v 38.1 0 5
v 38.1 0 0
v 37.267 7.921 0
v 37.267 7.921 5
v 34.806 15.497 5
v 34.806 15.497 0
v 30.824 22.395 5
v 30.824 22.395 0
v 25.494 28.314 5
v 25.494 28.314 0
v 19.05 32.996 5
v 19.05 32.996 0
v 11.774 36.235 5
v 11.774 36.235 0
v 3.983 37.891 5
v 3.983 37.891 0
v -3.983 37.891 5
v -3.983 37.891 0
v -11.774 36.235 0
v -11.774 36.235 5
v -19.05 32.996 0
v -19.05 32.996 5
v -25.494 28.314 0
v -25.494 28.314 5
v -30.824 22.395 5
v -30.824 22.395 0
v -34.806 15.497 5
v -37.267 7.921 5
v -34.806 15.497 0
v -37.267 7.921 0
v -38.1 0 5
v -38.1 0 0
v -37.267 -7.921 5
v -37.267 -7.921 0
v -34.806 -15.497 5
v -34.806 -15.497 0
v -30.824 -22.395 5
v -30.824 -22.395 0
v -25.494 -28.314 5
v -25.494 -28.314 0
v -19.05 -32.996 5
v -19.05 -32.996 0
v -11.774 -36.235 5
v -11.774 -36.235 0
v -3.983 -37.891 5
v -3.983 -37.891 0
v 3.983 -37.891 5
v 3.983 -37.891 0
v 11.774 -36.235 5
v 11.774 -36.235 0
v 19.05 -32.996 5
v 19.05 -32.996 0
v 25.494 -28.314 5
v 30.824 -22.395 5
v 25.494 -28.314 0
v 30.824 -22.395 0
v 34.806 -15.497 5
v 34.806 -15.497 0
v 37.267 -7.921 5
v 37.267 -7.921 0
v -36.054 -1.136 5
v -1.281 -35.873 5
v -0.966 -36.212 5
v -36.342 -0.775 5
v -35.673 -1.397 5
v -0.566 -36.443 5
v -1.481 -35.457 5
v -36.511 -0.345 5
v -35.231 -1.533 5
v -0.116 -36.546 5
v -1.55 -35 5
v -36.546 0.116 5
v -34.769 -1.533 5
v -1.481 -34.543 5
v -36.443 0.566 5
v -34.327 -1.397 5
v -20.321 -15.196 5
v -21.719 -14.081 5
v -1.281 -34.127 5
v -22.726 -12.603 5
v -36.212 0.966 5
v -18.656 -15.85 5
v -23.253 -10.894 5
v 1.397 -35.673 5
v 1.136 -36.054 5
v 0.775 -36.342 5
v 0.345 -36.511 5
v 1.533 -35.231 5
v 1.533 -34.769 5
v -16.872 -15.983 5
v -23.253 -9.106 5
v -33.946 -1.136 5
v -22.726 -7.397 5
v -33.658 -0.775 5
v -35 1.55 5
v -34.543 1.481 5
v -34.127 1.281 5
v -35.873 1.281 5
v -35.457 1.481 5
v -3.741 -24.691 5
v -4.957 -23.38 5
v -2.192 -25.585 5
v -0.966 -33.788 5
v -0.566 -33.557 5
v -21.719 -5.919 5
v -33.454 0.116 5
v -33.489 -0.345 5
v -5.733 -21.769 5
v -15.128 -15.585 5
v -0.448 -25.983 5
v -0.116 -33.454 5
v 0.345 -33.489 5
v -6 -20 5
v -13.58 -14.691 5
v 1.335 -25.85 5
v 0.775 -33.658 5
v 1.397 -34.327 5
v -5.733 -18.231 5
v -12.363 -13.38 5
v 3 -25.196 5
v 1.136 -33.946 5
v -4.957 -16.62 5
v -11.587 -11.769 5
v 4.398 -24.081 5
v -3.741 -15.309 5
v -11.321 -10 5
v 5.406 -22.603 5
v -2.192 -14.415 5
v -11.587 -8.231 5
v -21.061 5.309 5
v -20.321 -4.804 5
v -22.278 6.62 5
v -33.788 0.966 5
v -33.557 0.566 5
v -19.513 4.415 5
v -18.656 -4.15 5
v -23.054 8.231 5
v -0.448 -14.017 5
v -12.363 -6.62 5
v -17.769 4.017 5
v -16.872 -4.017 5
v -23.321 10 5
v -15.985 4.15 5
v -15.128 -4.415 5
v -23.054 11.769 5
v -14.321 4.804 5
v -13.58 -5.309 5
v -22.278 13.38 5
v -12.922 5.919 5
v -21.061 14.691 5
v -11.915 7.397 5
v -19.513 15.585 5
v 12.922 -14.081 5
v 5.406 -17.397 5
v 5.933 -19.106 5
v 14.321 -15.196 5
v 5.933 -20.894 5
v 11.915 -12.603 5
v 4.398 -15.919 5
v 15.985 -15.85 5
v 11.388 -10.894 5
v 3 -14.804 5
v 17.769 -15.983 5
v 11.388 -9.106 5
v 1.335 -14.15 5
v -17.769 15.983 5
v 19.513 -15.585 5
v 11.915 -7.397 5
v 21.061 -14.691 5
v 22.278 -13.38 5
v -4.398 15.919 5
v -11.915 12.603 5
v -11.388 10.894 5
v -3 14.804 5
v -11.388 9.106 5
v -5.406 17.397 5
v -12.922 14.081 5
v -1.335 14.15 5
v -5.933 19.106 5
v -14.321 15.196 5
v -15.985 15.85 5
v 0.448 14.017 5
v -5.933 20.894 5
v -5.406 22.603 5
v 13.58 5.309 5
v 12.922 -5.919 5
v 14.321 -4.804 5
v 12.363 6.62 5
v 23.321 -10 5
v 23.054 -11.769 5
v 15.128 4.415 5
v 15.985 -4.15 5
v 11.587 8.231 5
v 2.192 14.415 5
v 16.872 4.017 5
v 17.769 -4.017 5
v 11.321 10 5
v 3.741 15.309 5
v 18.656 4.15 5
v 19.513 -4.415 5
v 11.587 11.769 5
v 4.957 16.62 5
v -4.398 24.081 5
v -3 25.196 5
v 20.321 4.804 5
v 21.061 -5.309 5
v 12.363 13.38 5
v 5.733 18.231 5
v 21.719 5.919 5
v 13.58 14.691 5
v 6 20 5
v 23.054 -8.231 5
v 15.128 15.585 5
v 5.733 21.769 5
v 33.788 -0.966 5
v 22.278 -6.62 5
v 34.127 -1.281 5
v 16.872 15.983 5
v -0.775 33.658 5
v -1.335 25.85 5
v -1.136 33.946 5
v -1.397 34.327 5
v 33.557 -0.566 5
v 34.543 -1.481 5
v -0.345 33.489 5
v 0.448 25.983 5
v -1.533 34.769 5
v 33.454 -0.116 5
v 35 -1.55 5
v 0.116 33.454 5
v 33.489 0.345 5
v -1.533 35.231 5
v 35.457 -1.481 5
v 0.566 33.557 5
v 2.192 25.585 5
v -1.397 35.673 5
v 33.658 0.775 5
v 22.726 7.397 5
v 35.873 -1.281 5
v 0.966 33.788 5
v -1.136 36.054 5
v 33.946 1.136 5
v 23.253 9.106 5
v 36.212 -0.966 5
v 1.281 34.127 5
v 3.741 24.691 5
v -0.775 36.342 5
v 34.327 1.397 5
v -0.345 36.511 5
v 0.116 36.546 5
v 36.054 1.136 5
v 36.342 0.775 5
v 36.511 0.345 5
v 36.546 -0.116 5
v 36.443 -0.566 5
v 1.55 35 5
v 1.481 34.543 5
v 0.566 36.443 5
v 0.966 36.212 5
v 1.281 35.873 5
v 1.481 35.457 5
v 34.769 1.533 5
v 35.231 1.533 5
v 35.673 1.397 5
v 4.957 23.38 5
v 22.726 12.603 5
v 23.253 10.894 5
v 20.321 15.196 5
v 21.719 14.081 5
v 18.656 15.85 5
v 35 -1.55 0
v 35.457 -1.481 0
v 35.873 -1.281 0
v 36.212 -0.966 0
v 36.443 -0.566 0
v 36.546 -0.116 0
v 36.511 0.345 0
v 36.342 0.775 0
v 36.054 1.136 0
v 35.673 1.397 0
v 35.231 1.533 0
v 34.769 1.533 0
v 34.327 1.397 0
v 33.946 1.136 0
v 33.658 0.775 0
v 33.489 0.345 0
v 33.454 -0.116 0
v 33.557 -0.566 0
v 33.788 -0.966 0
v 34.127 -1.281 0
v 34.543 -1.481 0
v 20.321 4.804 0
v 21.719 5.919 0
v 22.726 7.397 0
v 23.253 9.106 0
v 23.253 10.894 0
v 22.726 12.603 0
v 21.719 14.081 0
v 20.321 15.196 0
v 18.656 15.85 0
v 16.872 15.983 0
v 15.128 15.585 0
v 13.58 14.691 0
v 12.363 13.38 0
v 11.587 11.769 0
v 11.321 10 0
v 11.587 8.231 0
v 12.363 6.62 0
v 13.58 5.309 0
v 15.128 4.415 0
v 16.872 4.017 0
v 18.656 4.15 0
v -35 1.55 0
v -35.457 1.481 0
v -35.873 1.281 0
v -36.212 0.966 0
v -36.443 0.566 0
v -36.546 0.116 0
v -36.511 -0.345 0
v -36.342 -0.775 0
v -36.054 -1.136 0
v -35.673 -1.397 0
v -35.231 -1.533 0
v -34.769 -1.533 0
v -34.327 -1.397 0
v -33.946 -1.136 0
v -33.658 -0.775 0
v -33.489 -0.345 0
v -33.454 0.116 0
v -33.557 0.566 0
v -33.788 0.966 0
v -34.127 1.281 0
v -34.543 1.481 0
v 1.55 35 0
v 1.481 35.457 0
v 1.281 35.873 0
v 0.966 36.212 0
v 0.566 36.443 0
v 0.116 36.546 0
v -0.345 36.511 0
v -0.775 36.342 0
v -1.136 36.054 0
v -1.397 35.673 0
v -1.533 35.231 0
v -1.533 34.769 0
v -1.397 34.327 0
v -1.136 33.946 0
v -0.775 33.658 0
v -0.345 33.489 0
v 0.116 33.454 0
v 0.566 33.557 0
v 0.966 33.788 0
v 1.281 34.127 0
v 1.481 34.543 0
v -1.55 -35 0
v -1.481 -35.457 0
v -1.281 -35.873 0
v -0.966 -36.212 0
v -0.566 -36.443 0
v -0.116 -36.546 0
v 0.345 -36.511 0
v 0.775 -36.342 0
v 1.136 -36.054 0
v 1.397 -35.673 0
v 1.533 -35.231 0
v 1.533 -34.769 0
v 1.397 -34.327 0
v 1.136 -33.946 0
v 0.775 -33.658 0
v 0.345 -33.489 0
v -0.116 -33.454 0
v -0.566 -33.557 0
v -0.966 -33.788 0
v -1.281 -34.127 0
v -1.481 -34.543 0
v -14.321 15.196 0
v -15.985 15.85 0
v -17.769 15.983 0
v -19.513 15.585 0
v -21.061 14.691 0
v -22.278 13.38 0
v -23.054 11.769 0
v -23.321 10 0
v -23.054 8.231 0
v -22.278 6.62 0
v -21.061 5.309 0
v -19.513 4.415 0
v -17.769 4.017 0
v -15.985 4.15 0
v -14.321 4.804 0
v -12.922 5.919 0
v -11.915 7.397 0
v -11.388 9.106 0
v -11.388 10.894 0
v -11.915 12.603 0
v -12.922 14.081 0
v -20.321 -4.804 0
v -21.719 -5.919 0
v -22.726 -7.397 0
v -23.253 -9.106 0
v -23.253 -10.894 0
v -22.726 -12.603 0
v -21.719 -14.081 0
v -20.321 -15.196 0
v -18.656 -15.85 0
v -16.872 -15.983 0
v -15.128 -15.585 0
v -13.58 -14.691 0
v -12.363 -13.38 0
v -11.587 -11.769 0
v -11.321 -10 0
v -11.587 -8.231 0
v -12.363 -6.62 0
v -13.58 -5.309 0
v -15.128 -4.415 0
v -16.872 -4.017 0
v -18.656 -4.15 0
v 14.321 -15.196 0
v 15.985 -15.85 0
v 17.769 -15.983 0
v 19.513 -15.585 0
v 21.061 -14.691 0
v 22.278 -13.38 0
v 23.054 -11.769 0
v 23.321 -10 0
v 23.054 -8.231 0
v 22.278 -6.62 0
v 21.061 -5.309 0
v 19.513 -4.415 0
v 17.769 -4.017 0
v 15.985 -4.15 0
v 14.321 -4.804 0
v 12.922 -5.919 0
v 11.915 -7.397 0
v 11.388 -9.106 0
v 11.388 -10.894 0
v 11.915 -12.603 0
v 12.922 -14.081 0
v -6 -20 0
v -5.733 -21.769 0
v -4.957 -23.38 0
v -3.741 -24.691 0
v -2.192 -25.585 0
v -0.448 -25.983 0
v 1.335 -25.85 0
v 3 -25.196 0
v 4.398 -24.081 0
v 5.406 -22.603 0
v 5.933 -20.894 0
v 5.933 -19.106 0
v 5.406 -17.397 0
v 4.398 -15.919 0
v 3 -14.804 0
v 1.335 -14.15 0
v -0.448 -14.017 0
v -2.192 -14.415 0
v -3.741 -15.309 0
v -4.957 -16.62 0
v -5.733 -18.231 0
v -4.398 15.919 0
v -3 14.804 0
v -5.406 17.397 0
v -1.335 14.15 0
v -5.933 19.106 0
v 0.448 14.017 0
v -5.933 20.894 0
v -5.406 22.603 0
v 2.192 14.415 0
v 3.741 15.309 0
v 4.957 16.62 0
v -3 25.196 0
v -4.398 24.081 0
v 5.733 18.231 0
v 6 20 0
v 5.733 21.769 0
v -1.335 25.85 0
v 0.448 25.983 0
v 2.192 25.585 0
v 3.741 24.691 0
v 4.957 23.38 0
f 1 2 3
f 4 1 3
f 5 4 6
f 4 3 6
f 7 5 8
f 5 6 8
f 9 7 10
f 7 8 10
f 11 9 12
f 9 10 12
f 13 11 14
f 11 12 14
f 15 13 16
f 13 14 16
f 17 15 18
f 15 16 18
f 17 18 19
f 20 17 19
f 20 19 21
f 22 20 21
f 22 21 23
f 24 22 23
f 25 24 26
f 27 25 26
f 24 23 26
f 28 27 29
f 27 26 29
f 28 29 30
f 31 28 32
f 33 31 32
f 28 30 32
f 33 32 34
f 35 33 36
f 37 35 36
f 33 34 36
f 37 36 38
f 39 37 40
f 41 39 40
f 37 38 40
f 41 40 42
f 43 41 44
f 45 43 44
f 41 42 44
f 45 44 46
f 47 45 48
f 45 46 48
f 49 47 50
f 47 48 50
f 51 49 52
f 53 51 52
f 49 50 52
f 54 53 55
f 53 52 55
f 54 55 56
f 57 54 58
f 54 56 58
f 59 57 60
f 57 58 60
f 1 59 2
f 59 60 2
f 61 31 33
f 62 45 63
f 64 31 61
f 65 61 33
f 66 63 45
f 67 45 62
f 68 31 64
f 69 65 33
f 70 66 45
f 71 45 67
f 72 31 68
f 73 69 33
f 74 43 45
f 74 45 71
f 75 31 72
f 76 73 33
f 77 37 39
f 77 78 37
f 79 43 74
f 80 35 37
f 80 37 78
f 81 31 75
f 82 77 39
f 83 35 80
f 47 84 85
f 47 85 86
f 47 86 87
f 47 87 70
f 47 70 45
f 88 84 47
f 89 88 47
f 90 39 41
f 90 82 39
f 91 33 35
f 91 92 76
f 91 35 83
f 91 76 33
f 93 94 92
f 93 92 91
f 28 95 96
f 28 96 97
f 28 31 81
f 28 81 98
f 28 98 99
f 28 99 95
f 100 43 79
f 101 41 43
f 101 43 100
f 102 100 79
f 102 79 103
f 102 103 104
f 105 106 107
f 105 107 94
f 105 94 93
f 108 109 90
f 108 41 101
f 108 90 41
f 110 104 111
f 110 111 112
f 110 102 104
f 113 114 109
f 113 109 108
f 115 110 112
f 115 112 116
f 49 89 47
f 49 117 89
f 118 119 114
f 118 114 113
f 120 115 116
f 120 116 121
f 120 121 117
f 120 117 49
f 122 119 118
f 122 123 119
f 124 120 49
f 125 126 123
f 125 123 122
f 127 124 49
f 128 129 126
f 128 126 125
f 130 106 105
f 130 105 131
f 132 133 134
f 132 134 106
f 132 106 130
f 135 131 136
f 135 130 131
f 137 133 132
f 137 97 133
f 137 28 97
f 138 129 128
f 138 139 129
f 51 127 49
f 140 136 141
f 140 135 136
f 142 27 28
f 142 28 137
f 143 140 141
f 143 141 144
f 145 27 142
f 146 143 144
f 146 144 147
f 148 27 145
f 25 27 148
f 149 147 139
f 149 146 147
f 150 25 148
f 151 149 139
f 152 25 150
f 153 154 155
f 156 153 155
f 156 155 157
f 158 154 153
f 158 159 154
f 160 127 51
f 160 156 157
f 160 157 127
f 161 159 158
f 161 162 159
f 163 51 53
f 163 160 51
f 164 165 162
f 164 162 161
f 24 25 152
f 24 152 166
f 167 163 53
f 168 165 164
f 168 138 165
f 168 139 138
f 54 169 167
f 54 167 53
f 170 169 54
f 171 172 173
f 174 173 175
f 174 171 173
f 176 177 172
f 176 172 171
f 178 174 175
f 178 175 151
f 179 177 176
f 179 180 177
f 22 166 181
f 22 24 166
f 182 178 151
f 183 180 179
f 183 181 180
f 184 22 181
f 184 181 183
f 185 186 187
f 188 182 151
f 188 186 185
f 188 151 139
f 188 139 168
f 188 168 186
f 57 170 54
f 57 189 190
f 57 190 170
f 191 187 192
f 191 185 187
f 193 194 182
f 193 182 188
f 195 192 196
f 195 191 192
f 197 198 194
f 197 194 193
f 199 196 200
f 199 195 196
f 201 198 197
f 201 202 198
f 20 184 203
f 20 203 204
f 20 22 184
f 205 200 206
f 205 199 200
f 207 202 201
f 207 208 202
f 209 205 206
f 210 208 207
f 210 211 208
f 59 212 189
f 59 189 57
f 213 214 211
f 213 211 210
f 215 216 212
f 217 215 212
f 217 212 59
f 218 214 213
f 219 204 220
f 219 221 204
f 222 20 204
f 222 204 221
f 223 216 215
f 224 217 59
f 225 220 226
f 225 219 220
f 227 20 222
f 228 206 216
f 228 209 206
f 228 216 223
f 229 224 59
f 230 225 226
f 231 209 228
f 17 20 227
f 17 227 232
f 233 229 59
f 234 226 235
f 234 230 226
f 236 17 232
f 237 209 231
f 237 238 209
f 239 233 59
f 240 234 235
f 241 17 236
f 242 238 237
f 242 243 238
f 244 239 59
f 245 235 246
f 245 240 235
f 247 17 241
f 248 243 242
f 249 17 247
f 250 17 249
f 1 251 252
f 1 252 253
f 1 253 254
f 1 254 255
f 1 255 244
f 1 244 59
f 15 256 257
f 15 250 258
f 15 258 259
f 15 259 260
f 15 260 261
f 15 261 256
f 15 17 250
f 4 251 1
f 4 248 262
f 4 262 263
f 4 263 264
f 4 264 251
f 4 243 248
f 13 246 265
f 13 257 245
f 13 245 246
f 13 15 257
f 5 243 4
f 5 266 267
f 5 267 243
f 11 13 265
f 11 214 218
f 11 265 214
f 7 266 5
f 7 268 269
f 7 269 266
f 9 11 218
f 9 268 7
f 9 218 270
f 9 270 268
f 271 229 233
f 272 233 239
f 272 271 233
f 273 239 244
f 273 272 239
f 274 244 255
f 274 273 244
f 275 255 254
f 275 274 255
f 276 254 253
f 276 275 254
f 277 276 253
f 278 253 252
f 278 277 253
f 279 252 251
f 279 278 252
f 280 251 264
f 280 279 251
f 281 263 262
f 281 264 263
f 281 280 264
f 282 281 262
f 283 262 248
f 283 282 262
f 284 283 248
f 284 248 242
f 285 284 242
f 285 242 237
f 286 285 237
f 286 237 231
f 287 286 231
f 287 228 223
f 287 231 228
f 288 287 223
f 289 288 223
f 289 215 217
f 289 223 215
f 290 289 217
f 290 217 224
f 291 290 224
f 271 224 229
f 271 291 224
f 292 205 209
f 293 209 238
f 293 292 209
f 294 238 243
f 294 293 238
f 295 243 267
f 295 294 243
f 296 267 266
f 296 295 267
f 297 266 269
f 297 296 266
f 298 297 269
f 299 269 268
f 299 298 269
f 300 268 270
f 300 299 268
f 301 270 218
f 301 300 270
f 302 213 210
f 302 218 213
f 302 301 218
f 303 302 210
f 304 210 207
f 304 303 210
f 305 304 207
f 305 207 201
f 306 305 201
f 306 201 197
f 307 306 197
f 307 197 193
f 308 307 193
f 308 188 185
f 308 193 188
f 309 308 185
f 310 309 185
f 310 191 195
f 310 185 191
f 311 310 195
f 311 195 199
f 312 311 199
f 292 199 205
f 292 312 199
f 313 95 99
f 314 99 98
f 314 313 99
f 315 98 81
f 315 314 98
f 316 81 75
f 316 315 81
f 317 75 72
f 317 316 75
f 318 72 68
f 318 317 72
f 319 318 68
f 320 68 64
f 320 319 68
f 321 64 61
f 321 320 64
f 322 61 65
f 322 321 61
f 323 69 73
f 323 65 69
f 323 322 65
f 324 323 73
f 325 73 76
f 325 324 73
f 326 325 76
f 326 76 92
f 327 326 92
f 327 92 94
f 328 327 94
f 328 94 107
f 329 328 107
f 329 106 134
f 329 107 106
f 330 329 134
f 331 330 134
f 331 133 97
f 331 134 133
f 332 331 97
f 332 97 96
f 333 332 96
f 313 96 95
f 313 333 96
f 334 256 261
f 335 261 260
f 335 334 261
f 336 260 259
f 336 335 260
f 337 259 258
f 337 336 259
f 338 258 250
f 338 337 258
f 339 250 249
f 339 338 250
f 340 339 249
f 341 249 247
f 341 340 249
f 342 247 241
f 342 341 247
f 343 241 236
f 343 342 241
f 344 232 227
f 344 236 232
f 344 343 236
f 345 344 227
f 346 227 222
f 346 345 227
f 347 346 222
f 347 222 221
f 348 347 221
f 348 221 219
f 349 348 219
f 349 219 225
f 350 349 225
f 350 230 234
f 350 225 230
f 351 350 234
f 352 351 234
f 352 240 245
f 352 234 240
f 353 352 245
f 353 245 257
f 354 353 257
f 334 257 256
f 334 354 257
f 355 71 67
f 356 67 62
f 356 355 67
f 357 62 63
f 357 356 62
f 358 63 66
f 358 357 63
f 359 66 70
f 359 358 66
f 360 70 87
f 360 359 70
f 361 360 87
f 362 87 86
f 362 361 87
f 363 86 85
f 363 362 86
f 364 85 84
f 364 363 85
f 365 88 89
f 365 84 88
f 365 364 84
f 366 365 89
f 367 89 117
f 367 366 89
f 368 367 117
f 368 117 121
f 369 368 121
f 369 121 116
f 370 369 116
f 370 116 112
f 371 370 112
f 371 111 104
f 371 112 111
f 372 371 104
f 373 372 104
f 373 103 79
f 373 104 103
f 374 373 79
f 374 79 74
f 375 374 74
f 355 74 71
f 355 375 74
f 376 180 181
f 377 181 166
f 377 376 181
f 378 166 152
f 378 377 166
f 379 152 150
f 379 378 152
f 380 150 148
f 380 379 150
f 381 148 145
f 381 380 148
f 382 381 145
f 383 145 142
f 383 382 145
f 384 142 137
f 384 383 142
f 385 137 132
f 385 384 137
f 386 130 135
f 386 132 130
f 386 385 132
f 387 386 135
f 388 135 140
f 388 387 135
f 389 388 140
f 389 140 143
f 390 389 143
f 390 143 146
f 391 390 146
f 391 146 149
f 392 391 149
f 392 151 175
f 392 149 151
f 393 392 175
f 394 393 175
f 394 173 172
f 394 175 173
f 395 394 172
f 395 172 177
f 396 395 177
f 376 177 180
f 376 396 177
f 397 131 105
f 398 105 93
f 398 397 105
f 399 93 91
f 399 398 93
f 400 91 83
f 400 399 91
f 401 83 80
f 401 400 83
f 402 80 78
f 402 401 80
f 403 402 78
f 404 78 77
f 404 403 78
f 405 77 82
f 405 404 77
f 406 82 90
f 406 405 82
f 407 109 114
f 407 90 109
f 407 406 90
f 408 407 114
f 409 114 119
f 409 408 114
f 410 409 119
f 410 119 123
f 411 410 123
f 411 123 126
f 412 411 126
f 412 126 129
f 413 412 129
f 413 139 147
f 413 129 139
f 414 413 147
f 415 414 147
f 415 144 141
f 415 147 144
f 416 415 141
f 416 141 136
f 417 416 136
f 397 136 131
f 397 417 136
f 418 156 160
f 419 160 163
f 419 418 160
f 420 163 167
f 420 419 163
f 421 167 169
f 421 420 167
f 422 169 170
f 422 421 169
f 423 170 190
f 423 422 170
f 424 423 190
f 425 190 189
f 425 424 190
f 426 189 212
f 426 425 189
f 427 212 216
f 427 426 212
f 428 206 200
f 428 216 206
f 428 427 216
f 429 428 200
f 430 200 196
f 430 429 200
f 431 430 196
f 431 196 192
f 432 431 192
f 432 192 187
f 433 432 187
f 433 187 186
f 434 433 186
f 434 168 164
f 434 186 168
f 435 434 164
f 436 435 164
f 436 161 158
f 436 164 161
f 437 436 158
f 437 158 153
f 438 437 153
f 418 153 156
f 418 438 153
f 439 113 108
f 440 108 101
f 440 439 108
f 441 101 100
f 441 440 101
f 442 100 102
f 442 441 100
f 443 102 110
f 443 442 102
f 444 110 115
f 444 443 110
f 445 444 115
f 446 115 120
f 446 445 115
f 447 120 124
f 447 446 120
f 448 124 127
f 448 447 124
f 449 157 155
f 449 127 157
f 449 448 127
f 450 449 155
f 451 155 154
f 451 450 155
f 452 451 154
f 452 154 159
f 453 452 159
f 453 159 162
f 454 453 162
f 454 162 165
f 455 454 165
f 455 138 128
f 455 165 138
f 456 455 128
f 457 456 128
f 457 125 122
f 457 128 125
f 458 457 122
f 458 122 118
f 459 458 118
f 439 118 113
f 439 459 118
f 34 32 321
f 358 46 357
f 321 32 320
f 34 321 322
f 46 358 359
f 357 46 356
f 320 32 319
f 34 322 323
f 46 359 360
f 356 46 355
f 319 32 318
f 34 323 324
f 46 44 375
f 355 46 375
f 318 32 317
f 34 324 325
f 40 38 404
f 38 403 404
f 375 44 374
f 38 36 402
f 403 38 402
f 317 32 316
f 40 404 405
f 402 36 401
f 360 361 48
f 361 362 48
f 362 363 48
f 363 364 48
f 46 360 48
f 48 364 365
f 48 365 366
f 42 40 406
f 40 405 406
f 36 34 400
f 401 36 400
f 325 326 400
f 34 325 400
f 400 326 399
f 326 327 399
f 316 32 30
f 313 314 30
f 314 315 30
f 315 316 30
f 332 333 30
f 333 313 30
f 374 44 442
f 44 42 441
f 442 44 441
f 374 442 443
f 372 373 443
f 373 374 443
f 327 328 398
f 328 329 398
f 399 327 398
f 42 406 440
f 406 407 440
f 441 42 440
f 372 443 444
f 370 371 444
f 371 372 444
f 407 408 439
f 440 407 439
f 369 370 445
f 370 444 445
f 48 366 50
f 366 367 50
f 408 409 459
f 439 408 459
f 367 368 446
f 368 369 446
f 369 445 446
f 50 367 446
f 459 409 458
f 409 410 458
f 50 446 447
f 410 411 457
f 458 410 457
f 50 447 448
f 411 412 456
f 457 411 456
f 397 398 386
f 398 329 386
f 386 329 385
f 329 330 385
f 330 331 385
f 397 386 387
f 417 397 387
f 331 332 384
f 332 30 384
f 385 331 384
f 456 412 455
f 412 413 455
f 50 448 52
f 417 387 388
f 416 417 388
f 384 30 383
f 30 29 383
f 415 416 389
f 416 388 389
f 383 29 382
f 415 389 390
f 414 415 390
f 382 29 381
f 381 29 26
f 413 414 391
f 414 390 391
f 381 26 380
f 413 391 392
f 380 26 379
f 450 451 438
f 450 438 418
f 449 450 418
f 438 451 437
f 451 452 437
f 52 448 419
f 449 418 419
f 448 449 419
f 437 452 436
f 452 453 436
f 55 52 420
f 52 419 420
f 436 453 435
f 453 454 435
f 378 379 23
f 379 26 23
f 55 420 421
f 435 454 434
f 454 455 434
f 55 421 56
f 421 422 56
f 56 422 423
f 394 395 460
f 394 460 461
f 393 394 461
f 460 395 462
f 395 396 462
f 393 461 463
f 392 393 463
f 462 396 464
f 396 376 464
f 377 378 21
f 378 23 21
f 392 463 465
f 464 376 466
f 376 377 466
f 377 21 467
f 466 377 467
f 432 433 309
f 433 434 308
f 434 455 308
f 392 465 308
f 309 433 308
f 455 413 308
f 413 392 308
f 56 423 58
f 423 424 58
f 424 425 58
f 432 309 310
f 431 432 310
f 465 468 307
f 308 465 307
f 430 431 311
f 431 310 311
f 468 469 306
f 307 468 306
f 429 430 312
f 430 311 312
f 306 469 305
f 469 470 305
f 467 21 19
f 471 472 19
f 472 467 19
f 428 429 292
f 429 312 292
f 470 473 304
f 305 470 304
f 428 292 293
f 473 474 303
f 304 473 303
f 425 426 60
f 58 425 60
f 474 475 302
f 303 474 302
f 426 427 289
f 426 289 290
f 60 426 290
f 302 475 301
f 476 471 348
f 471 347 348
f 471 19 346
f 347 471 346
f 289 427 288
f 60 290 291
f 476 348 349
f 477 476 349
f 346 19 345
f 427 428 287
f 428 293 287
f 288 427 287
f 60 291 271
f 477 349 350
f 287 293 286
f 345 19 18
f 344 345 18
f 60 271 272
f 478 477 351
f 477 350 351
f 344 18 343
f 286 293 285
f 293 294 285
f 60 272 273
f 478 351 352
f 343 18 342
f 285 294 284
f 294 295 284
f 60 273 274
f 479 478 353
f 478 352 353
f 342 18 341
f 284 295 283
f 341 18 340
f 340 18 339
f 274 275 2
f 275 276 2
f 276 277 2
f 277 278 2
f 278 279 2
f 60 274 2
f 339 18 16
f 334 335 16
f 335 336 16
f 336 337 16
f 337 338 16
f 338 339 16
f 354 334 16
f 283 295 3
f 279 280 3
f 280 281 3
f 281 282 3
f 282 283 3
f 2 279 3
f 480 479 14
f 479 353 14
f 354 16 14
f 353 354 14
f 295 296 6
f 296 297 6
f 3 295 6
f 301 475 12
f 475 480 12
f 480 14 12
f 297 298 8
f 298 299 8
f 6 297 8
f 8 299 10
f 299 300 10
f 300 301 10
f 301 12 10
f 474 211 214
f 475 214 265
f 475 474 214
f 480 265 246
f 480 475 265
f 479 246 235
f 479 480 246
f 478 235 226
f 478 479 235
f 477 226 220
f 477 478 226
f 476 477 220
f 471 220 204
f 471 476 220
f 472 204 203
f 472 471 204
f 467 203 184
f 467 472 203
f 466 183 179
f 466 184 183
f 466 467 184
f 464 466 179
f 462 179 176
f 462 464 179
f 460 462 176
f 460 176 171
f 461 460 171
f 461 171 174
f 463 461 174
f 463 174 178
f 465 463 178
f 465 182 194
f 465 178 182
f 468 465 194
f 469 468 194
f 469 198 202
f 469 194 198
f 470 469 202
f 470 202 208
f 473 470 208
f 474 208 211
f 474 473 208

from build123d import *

# Parameters (mm, degrees)
F0_R     = 38.1
F0_R_2   = 7.5
F0_R_3   = 6
F0_R_4   = 1.55
F1_DEPTH = 5
F2_DEPTH = 25
F3_COUNT = 6
F4_DEPTH = 25
F5_COUNT = 4
F6_DEPTH = 5


with BuildPart() as f1:
    # F0 (on Top) → F1 (new body)
    with BuildSketch(Plane.XY):
        Circle(F0_R)
        Circle(F0_R_2, mode=Mode.SUBTRACT)
        with Locations((0, 20)):
            Circle(F0_R_3, mode=Mode.SUBTRACT)
        with Locations((0, 35)):
            Circle(F0_R_4, mode=Mode.SUBTRACT)
        with Locations((0, 20)):
            Circle(F0_R_3)
        with Locations((0, 35)):
            Circle(F0_R_4)
    extrude(amount=F1_DEPTH)

    # F3: F2 ×6 about axis
    f3_axis = Axis((0, 0, 5), (0, 0, 1))


with BuildPart() as f2:
    # F0 (on Top) → F2 (new body)
    with BuildSketch(Plane.XY):
        with Locations((0, 20)):
            Circle(F0_R_3)
    extrude(amount=F2_DEPTH)


with BuildPart() as f1_1:
    add(f1.part)
    for i in range(1, F3_COUNT):
        add(f2.part.rotate(f3_axis, i * 360 / F3_COUNT), mode=Mode.SUBTRACT)

    # F3#seed: cut F2
    add(f2.part, mode=Mode.SUBTRACT)

    # F5: F4 ×4 about axis
    f5_axis = Axis((0, 0, 5), (0, 0, 1))


with BuildPart() as f4:
    # F0 (on Top) → F4 (new body)
    with BuildSketch(Plane.XY):
        with Locations((0, 35)):
            Circle(F0_R_4)
    extrude(amount=F4_DEPTH)


with BuildPart() as f1_2:
    add(f1_1.part)
    for i in range(1, F5_COUNT):
        add(f4.part.rotate(f5_axis, i * 360 / F5_COUNT), mode=Mode.SUBTRACT)

    # F5#seed: cut F4
    add(f4.part, mode=Mode.SUBTRACT)

    # F0 (on Top) → F6 (join)
    with BuildSketch(Plane.XY):
        Circle(F0_R_2)
    extrude(amount=F6_DEPTH)


solid = f1_2.part
